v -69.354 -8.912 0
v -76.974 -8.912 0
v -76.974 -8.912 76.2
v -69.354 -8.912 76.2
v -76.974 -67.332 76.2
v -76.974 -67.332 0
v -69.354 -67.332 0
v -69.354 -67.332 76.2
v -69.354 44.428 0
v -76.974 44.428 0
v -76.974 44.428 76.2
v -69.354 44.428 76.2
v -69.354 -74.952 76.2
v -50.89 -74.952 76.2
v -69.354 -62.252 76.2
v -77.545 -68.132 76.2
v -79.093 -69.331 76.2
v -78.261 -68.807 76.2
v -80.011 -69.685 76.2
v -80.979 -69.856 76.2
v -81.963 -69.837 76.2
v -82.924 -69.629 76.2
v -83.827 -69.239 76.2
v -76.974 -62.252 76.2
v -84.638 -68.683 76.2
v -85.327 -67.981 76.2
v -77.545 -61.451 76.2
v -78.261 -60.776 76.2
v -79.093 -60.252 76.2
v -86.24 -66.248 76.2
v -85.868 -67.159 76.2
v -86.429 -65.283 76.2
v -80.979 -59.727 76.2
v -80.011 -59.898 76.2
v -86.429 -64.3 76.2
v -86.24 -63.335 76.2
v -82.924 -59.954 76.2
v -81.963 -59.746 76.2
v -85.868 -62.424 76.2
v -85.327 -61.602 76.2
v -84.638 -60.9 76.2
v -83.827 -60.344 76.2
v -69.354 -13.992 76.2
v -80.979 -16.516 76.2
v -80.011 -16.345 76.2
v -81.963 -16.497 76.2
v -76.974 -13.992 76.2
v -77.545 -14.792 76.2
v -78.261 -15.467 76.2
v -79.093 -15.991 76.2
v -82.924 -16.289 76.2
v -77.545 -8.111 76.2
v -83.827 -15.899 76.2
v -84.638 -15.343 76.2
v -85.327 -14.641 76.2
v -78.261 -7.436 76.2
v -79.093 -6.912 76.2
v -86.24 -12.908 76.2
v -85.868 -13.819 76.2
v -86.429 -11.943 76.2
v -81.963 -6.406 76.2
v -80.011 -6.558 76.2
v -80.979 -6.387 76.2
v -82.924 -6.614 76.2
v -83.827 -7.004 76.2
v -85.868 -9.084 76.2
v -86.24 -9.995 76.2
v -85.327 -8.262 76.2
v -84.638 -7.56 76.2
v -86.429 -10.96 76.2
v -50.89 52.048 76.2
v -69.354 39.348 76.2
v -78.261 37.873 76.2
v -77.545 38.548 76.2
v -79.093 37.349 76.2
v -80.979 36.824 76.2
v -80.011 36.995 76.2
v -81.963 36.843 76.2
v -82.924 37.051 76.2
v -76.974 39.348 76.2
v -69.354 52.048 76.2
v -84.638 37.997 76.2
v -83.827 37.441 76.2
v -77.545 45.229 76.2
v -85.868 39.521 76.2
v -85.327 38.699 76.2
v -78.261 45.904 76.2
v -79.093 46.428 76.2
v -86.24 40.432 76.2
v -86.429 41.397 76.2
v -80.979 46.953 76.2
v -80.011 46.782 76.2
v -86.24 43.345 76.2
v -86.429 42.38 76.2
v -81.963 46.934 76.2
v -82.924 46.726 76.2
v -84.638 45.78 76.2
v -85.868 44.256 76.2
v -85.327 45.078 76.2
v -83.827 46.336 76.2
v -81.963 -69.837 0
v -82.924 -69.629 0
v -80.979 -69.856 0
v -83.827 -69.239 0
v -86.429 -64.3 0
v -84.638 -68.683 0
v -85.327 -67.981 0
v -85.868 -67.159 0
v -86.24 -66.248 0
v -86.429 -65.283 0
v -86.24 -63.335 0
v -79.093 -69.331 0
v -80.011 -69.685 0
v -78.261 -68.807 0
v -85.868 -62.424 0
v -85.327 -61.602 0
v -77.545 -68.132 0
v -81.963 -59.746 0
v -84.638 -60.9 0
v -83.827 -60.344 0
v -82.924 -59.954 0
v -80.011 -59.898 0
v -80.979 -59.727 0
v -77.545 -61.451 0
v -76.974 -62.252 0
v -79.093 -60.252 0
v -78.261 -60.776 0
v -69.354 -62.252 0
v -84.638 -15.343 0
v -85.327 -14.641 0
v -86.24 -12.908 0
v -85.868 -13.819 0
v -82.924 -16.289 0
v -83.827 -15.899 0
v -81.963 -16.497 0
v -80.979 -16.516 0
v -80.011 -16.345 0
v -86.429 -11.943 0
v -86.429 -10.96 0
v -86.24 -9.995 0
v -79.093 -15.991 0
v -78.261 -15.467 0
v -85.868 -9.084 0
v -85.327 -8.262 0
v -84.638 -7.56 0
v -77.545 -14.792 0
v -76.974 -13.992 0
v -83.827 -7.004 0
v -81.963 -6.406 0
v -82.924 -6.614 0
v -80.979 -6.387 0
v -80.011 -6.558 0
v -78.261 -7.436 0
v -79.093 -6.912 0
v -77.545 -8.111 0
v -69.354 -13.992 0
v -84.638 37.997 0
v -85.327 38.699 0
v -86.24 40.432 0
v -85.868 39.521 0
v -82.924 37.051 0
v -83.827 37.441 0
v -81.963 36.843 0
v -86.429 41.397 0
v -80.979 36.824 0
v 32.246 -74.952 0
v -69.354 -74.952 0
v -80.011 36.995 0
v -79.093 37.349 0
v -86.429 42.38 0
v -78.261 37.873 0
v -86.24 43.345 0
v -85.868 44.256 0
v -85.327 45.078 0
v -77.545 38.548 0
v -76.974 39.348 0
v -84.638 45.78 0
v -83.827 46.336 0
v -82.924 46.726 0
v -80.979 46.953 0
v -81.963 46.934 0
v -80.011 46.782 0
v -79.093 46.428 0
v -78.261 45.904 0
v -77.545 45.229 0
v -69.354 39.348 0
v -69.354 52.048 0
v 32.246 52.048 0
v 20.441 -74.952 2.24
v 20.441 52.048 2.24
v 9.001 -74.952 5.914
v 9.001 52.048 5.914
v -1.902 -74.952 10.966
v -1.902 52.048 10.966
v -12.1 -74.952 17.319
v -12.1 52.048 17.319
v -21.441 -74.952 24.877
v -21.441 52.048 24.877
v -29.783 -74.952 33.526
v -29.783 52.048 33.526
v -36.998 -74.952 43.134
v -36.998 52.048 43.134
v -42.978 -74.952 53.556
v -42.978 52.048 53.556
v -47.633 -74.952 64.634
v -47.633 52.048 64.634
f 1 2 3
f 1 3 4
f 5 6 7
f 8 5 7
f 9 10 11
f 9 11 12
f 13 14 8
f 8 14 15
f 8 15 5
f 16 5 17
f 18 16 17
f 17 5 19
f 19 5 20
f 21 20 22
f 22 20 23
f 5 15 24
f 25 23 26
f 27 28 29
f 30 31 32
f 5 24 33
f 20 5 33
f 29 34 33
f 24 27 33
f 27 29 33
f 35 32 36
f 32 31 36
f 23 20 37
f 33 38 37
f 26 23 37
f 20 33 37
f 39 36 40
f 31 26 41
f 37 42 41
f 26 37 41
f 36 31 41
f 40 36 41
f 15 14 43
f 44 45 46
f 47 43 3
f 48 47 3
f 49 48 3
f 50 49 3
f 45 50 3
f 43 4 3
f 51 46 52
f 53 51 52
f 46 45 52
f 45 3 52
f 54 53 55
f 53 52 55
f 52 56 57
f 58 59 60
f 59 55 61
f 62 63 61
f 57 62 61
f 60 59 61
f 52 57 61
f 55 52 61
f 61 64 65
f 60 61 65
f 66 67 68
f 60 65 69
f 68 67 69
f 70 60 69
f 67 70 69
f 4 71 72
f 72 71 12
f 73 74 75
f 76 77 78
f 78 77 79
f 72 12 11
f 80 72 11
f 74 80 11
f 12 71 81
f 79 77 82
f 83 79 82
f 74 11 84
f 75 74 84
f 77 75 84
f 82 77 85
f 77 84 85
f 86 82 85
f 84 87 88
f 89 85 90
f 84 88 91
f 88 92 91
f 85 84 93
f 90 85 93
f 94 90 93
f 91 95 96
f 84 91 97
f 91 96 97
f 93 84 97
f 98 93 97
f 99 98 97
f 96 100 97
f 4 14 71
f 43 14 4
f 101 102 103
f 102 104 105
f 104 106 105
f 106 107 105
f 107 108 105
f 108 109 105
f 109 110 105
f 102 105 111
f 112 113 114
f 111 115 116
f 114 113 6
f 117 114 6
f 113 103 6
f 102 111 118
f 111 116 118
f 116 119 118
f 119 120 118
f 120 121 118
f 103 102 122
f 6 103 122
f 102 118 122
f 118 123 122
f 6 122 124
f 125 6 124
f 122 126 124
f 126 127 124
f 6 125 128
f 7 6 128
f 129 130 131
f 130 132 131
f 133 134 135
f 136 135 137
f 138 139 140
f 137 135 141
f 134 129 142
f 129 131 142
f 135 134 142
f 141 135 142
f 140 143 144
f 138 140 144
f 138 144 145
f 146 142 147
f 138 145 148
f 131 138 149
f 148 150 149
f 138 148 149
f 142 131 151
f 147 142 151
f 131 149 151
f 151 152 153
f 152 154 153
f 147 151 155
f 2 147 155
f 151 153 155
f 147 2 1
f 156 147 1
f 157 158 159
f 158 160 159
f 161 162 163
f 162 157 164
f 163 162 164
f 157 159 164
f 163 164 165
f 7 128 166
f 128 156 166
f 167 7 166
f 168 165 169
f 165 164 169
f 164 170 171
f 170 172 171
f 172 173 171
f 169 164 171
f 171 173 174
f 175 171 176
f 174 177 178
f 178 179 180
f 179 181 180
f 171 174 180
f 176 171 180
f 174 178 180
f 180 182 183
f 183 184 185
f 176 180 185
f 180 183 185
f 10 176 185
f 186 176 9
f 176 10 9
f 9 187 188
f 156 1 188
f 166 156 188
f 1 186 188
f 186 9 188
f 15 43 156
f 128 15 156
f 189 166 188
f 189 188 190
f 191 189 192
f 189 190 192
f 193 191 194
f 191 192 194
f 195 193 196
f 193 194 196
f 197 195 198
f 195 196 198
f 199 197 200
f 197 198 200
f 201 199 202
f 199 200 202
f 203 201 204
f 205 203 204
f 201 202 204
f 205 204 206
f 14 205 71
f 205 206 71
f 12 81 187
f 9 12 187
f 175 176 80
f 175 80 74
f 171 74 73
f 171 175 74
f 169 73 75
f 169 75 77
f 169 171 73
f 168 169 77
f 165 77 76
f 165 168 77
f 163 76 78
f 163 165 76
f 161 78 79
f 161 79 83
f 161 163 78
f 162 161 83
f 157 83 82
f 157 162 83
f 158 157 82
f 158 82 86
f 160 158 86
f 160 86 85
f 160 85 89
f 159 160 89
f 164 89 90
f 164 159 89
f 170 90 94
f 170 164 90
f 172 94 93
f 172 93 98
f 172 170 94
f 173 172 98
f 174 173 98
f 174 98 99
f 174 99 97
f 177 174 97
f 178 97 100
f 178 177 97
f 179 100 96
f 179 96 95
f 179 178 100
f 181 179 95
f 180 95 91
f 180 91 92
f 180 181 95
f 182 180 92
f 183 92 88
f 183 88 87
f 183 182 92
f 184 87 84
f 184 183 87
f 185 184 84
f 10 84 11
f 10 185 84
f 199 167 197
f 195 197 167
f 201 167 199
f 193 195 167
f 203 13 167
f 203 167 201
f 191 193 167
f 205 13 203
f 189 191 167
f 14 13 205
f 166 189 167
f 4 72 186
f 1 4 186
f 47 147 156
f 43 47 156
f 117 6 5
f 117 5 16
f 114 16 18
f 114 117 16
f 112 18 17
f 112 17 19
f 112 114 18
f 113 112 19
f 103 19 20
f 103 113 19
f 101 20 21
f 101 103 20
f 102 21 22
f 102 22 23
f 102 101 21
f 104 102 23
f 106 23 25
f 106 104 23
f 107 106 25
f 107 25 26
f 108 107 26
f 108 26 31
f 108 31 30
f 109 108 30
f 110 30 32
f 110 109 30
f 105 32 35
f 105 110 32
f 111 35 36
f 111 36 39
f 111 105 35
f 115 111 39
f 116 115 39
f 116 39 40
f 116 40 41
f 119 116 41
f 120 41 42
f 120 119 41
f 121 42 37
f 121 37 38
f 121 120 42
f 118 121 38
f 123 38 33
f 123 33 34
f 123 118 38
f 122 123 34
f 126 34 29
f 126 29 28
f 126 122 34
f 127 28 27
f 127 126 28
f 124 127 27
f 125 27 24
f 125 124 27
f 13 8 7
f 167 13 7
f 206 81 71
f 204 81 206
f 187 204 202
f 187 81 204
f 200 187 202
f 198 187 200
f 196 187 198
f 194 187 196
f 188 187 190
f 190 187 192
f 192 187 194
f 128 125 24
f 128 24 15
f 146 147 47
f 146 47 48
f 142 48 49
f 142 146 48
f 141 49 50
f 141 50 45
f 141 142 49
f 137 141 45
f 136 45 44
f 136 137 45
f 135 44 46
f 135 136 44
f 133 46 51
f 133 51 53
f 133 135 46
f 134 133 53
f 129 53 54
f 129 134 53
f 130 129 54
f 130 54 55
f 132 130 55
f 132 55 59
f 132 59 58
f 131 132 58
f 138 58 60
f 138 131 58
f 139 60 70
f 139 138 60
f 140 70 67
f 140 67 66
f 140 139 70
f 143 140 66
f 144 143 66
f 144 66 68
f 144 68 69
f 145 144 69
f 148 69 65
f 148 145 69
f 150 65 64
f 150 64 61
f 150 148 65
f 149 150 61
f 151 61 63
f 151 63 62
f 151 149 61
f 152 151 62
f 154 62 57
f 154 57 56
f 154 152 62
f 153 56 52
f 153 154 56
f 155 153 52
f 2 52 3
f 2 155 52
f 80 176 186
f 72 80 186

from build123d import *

# Parameters (mm, degrees)
F0_W     = 101.6
F0_H     = 101.6
F1_DEPTH = 76.2
F3_DEPTH = 101.6
F4_W     = 63.5649934411
F4_H     = 88.8701714575
F5_DEPTH = 7.62
F7_DEPTH = 25.4
F8_W     = 7.62
F8_H     = 5.08
F9_DEPTH = 76.2


# Not quite as in the source:
# - a feature names something its author has since deleted; it is built from what else it names


with BuildPart() as f1:
    # F0 (on Top) → F1 (new body)
    with BuildSketch(Plane.XY):
        with Locations((-18.5535050273, 1.2484980512)):
            Rectangle(F0_W, F0_H)
    extrude(amount=F1_DEPTH)

    # F2 (on face) → F3 (cut)
    with BuildSketch(Plane.XZ.offset(49.5515019488)):
        with BuildLine():
            Line((32.2464949727, 76.2), (-50.8901812136, 76.2))
            ThreePointArc((-50.8901812136, 76.2), (-21.4414456403, 24.8771198137), (32.2464949727, 0))
            Line((32.2464949727, 0), (32.2464949727, 76.2))
        make_face()
    extrude(amount=-F3_DEPTH, mode=Mode.SUBTRACT)

    # F4 (on face) → F5 (join)
    with BuildSketch(Plane(origin=(0, 0, 0), x_dir=(1, 0, 0), z_dir=(0, 0, -1))):
        with Locations((-31.7824967206, -2.1479185671)):
            Rectangle(F4_W, F4_H)
    extrude(amount=-F5_DEPTH)

    # F6 (on face) → F7 (join)
    with BuildSketch(Plane.XZ.offset(49.5515019488)):
        with BuildLine():
            Line((-69.3535050273, 76.2), (-69.3535050273, 0))
            Line((-69.3535050273, 0), (32.2464949727, 0))
            ThreePointArc((32.2464949727, 0), (-21.4414456403, 24.8771198137), (-50.8901812136, 76.2))
            Line((-50.8901812136, 76.2), (-69.3535050273, 76.2))
        make_face()
    extrude(amount=F7_DEPTH)

    # F8 (on face) → F9 (join)
    with BuildSketch(Plane(origin=(0, 0, 0), x_dir=(1, 0, 0), z_dir=(0, 0, -1))):
        with BuildLine():
            Line((-76.9735050273, -44.4284980512), (-76.9735050273, -39.3484980512))
            ThreePointArc((-76.9735050273, -39.3484980512), (-86.4529140785, -41.8884980512), (-76.9735050273, -44.4284980512))
        make_face()
        with Locations((-73.1635050273, -41.8884980512)):
            Rectangle(F8_W, F8_H)
        with BuildLine():
            Line((-76.9735050273, 8.9115019488), (-76.9735050273, 13.9915019488))
            ThreePointArc((-76.9735050273, 13.9915019488), (-86.4529140785, 11.4515019488), (-76.9735050273, 8.9115019488))
        make_face()
        with Locations((-73.1635050273, 11.4515019488)):
            Rectangle(F8_W, F8_H)
        with Locations((-73.1635050273, 64.7915019488)):
            Rectangle(F8_W, F8_H)
        with BuildLine():
            ThreePointArc((-76.9735050273, 67.3315019488), (-86.4529140785, 64.7915019488), (-76.9735050273, 62.2515019488))
            Line((-76.9735050273, 62.2515019488), (-76.9735050273, 67.3315019488))
        make_face()
    extrude(amount=-F9_DEPTH)


solid = f1.part
